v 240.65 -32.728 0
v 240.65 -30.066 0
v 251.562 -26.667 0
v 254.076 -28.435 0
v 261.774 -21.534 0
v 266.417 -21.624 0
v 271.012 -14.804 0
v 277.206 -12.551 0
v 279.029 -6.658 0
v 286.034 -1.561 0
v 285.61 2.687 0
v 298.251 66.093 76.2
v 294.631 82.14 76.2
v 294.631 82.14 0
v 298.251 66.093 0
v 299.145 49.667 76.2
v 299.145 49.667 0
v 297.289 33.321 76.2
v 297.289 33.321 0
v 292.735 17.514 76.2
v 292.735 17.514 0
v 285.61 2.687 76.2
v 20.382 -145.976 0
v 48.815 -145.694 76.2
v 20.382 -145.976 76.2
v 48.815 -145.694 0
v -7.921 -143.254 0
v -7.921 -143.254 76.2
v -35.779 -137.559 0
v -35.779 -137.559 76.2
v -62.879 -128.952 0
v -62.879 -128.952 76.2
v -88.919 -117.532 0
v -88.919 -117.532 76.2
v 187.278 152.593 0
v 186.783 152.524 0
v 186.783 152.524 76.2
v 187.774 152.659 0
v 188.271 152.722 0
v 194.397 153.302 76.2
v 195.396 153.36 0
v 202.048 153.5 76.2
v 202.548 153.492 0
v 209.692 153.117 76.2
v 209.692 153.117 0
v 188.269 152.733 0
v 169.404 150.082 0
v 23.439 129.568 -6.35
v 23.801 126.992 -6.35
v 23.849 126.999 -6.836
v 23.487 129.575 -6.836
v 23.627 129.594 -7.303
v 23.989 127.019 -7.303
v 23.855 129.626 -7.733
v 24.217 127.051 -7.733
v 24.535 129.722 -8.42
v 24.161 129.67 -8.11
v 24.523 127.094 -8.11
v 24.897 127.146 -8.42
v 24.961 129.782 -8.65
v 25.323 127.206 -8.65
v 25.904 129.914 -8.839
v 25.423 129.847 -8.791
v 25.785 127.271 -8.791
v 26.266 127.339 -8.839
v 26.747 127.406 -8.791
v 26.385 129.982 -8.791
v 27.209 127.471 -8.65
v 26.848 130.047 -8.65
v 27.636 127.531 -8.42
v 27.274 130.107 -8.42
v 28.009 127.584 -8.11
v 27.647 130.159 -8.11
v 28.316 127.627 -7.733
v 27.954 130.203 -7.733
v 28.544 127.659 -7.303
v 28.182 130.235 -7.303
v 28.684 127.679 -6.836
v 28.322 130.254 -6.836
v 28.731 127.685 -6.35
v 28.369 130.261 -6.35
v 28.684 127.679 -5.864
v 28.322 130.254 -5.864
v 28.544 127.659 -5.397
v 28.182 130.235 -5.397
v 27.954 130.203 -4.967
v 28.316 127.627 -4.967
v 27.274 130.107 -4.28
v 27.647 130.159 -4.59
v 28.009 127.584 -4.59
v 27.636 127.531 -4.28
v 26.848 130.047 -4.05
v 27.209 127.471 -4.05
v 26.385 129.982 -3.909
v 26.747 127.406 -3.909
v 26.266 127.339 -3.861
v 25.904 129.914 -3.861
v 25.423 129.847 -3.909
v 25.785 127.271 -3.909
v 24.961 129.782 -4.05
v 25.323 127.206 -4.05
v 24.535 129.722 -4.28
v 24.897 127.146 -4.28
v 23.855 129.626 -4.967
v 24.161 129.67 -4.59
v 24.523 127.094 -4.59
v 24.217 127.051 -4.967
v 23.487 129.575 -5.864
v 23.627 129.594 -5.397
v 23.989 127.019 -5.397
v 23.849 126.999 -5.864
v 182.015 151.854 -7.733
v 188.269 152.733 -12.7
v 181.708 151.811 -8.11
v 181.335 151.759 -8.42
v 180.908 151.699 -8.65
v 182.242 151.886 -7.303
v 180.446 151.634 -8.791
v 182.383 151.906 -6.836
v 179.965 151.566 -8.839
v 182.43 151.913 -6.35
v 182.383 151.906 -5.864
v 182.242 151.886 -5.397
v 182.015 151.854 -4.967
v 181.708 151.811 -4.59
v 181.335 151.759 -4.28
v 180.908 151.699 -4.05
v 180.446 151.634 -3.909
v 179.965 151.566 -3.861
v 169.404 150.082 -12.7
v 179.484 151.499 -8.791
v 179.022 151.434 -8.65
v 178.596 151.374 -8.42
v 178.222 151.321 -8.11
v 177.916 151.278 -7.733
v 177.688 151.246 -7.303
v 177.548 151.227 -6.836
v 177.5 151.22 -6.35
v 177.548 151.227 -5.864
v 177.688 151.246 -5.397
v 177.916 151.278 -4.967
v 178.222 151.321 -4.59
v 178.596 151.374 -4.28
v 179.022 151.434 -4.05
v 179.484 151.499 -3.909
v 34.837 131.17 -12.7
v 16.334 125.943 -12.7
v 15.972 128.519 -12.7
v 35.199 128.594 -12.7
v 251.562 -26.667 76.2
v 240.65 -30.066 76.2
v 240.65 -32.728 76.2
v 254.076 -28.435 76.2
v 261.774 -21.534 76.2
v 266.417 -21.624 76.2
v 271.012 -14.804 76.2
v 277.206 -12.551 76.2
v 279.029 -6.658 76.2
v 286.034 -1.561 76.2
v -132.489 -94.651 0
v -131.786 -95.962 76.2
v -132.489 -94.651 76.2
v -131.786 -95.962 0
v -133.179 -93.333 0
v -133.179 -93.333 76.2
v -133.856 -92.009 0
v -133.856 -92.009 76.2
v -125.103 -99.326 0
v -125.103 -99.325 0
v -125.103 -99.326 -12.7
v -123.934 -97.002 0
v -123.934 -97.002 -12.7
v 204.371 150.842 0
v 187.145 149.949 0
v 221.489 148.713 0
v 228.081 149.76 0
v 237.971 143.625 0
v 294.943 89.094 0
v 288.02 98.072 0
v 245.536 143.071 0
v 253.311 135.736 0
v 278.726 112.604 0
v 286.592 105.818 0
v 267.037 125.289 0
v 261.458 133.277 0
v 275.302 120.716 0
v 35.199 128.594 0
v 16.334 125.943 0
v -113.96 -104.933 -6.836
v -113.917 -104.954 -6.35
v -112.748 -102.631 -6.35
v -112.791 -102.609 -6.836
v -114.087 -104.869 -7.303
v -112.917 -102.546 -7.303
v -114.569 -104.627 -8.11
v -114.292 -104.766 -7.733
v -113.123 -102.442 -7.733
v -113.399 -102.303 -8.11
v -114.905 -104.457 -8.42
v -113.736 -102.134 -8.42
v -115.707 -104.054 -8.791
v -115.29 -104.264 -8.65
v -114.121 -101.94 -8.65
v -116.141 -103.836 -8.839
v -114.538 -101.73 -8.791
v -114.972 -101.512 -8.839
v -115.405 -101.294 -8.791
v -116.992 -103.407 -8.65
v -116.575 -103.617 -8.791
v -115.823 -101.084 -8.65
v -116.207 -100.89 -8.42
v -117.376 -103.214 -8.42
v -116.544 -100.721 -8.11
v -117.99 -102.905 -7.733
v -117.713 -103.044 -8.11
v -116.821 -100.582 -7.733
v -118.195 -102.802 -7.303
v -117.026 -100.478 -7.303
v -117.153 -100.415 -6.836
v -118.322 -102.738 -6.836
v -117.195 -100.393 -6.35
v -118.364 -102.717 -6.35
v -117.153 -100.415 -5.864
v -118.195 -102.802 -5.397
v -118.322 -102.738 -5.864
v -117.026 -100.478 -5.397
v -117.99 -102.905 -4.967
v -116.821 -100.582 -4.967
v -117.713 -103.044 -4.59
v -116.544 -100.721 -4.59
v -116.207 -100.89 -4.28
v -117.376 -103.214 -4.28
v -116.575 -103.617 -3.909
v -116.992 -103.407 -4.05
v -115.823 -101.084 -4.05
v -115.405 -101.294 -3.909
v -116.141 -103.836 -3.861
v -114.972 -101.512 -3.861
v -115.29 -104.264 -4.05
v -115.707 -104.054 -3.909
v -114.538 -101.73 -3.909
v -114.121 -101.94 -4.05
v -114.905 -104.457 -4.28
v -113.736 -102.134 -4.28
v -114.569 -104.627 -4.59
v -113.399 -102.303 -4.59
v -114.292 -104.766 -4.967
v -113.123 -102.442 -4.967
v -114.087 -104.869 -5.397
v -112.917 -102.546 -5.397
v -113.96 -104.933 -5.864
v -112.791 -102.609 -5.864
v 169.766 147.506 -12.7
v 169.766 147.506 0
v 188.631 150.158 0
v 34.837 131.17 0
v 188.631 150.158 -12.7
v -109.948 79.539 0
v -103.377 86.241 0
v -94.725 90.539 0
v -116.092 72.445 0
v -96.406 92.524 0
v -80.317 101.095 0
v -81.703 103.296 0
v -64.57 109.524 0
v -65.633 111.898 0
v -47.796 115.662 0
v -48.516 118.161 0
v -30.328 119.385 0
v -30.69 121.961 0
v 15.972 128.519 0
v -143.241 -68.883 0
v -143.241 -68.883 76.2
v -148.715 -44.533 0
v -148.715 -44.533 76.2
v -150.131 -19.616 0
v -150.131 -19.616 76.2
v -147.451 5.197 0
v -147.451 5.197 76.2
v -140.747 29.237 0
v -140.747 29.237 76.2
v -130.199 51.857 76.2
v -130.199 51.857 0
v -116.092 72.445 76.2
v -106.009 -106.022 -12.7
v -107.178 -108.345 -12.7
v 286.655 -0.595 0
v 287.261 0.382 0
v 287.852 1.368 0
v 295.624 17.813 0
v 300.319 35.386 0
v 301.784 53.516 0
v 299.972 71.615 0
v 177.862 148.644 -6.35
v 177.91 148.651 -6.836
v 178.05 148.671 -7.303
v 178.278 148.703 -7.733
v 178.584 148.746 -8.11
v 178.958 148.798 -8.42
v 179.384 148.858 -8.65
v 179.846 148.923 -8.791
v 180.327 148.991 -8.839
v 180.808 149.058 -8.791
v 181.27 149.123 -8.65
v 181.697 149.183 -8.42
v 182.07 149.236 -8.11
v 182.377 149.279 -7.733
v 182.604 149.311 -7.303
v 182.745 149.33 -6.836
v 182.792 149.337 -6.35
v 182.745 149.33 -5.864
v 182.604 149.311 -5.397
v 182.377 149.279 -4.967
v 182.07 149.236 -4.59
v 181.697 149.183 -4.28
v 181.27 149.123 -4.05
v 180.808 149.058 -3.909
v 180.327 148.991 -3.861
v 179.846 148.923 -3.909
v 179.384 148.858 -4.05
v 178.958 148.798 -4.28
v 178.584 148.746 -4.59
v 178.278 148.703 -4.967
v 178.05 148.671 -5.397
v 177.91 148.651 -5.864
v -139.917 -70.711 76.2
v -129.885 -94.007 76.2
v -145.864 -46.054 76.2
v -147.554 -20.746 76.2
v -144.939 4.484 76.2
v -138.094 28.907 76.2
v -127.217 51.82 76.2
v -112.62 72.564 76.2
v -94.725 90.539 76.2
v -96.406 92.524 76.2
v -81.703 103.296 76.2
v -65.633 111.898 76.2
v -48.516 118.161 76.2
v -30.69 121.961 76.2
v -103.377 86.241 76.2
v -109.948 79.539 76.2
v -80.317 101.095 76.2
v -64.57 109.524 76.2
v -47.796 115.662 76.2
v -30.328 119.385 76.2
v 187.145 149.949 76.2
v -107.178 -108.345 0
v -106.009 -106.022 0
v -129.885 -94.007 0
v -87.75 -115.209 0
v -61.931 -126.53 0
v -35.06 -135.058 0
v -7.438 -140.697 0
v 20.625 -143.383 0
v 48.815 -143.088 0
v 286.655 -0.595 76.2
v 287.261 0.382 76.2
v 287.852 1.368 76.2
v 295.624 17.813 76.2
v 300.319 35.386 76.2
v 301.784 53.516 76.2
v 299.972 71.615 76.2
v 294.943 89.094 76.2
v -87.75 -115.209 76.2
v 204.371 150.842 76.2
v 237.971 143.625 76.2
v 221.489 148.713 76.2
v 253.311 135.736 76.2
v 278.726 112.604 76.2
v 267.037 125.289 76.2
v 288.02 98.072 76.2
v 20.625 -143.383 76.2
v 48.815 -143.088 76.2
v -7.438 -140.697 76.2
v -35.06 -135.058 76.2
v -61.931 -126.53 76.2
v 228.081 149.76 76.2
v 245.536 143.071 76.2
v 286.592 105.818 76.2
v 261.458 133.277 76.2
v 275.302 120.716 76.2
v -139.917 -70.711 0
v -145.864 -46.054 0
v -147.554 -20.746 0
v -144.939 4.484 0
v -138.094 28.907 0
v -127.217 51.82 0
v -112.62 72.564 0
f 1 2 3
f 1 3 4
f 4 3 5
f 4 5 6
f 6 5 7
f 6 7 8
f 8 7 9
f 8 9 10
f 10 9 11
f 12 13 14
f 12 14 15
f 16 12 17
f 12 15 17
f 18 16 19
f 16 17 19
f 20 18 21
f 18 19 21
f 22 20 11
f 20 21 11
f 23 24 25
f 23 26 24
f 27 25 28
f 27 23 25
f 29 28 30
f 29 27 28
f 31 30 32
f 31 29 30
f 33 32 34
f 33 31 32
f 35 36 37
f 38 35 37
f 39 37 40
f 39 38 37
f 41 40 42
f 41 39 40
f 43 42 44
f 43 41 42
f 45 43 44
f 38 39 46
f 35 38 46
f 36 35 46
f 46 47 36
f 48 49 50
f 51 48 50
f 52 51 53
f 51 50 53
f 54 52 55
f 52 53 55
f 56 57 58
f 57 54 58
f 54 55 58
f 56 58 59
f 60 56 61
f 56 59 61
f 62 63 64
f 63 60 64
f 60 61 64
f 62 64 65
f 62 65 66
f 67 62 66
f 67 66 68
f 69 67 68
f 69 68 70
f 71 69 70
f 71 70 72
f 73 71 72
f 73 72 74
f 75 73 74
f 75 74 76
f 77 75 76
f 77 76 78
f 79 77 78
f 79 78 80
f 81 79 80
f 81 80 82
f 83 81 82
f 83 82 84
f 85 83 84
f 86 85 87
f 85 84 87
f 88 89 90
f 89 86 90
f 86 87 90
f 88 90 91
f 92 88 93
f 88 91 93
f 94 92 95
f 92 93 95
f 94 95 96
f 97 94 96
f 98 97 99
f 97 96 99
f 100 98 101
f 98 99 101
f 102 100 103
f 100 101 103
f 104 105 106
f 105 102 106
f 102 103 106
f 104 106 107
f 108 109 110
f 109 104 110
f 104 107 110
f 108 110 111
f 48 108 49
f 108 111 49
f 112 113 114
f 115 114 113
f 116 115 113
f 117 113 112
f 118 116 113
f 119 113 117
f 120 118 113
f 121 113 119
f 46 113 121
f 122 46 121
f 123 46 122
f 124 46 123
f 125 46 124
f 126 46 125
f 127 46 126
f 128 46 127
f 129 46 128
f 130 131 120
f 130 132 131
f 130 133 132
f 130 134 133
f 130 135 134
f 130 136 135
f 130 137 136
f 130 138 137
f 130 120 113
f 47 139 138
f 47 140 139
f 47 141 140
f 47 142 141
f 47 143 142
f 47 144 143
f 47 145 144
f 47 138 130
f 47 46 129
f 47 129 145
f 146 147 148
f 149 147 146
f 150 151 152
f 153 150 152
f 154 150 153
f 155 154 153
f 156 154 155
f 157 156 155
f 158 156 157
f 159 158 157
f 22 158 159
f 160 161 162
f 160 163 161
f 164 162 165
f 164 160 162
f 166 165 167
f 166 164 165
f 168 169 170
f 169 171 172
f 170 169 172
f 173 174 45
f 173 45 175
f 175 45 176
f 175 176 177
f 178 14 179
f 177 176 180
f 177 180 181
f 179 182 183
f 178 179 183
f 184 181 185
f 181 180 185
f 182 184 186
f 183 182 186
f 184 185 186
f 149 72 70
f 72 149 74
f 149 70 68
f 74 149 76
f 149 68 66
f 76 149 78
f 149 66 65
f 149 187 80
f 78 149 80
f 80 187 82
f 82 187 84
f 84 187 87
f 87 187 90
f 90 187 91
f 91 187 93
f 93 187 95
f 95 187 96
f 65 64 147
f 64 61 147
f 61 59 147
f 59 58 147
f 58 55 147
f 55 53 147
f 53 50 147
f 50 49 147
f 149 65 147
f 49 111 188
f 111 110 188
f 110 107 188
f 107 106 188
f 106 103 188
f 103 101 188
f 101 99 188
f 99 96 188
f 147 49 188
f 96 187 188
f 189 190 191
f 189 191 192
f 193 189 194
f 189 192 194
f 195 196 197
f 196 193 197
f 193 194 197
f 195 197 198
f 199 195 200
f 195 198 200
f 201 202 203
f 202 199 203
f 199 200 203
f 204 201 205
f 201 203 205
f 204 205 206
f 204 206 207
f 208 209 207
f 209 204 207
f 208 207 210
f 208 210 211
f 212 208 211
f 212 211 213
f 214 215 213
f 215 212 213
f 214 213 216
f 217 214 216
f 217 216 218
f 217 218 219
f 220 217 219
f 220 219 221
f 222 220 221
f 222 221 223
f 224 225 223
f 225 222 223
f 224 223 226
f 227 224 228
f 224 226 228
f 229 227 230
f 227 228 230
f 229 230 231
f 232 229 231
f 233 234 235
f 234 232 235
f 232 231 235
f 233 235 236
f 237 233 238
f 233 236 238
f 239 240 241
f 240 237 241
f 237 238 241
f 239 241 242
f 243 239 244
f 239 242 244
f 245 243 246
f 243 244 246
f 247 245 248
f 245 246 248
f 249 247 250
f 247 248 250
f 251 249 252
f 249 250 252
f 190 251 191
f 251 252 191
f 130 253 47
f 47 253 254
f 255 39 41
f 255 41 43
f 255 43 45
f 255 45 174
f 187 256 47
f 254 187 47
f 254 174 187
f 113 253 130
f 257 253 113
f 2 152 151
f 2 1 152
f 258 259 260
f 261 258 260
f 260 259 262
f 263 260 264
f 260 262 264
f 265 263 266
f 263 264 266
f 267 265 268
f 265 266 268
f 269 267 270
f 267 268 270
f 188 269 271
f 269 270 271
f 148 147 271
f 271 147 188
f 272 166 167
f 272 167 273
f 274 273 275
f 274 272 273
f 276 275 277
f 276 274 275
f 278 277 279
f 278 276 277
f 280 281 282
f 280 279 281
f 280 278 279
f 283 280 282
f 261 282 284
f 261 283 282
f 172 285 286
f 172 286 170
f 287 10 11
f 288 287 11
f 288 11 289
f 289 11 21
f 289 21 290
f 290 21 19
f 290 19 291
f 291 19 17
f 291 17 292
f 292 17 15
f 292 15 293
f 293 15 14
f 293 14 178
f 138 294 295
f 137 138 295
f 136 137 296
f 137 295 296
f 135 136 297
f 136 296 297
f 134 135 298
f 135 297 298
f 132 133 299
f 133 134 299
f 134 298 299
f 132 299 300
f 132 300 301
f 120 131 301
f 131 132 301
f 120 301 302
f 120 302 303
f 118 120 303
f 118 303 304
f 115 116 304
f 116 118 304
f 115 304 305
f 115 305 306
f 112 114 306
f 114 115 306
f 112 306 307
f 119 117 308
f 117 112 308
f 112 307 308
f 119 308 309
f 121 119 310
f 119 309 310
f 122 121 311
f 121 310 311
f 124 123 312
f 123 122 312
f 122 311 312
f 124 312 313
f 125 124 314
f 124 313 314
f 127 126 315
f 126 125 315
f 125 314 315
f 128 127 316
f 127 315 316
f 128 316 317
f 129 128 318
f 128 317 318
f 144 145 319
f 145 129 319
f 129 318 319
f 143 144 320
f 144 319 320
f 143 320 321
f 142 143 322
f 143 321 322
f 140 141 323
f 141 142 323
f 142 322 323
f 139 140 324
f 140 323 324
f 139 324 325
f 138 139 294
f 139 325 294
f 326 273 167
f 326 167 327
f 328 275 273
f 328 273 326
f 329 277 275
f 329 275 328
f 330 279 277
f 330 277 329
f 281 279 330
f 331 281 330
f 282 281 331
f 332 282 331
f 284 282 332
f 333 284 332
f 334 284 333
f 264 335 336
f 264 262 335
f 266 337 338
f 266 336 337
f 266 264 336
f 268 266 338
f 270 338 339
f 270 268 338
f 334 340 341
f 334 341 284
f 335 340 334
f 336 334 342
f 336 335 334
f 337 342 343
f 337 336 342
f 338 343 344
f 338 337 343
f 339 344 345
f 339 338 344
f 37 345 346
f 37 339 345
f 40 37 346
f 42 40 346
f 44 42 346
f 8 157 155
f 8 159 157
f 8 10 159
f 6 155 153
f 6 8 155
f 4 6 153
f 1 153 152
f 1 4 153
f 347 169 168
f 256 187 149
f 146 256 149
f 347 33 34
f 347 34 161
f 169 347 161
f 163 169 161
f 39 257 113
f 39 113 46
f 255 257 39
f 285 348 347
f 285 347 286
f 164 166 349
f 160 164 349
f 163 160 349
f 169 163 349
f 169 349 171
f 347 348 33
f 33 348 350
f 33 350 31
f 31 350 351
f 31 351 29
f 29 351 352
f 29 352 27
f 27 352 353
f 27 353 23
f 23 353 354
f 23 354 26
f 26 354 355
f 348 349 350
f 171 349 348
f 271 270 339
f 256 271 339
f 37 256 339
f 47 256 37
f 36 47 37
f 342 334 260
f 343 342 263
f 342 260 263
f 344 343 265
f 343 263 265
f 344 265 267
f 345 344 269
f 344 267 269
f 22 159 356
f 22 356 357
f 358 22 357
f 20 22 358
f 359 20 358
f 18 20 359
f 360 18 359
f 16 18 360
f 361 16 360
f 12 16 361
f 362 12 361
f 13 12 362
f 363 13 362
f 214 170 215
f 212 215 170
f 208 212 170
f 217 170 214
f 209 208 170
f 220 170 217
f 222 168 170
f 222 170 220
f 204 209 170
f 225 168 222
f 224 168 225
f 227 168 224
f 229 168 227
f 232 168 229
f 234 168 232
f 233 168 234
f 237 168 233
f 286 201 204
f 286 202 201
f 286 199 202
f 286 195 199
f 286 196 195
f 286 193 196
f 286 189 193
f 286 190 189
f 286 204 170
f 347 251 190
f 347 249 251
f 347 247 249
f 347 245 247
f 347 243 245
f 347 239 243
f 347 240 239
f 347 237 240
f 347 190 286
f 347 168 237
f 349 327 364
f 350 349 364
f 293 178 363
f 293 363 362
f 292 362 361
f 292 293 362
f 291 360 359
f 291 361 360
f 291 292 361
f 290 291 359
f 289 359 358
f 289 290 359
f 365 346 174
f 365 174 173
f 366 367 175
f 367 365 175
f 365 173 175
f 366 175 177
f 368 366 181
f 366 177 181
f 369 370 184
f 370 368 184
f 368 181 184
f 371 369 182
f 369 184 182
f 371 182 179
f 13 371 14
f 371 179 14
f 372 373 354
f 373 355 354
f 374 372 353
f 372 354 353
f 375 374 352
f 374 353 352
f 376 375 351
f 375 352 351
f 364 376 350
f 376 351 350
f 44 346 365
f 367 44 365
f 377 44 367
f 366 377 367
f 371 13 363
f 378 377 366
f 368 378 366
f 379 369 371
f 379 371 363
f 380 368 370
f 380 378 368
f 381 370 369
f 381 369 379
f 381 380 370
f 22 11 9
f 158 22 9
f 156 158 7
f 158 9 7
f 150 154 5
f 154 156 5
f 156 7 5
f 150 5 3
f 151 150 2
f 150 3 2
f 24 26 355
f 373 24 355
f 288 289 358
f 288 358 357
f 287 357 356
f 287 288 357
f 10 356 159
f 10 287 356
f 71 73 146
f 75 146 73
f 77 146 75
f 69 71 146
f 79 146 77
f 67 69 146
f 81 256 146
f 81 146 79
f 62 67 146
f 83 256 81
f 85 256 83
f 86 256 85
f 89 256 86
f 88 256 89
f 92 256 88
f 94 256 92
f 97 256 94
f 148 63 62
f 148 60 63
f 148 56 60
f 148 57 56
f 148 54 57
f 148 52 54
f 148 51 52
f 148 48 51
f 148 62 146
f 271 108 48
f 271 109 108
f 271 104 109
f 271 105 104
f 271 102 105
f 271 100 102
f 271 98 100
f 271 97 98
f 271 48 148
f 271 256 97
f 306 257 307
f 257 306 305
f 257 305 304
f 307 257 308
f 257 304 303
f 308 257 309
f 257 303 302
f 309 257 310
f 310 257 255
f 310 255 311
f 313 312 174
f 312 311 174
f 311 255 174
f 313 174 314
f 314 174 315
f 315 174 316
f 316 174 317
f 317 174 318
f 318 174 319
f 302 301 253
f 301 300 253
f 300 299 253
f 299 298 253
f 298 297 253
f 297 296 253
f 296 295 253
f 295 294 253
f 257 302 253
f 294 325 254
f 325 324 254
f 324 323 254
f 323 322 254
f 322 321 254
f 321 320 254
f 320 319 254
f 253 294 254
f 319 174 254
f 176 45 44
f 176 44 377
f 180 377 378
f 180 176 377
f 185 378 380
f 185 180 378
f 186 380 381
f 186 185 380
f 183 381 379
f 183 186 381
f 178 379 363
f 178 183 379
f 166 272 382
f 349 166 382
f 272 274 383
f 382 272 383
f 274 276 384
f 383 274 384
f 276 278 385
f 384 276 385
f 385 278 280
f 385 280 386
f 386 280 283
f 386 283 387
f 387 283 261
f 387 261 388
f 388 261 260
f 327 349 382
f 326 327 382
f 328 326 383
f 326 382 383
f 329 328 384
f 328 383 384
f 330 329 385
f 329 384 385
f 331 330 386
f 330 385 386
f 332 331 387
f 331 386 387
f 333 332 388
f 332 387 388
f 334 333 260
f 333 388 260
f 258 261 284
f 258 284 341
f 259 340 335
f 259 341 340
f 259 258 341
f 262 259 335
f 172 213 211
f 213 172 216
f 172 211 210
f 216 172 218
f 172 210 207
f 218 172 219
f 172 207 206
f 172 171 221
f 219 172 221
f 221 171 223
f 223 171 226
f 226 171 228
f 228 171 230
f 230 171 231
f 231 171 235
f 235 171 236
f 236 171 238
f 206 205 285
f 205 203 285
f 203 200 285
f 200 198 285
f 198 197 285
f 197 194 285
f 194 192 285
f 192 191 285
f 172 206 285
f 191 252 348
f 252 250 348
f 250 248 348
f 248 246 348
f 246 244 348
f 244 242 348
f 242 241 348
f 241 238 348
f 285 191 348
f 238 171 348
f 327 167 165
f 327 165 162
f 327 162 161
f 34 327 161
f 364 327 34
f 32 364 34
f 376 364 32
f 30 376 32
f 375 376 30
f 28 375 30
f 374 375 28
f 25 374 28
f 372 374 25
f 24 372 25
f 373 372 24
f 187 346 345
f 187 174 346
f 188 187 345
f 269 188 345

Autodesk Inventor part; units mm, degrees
ref_plane "YZ Plane" through (0, 0, 0) normal (1, 0, 0) x (0, 1, 0)
ref_plane "XZ Plane" through (0, 0, 0) normal (0, 1, 0) x (-1, 0, 0)
ref_plane "XY Plane" through (0, 0, 0) normal (0, 0, 1) x (1, 0, 0)
ref_plane "Work Plane1" through (0, 0, 0) normal (0, 0, 1) x (1, 0, 0)
sketch "Sketch1" plane through (0, 0, 0) normal (0, 0, 1) x (1, 0, 0)
  line L0 (-149.3377, -84.2183) -> (-62.5438, -127.8928) projected
  arc A0 (-30.3276, 119.385) -> (-94.7251, 90.539) centre (-12.6526, -6.379) ccw projected
  line L1 (-94.7251, 90.539) -> (-158.4791, 36.5506) projected
  line L2 (267.4038, 161.2284) -> (-30.3276, 119.385) projected
  arc A1 (285.61, 2.6867) -> (293.3792, 54.1689) centre (225.4026, 38.1) ccw projected
  line L3 (293.3792, 54.1689) -> (297.7515, 151.832) projected
  line L4 (297.7015, -118.5771) -> (285.61, 2.6867) projected
  line L5 (-30.3276, 119.385) -> (187.1449, 149.9488)
  arc A2 (285.61, 2.6867) -> (187.1449, 149.9488) centre (200.8332, 52.5515) ccw
  arc A3 (240.6498, -30.0656) -> (285.61, 2.6867) centre (225.4026, 38.1) ccw
  arc A4 (-30.3276, 119.385) -> (-94.7251, 90.539) centre (-12.6526, -6.379) ccw
  line L6 (-149.3377, -84.2183) -> (-62.5438, -127.8928) projected
  line L7 (-129.8851, -94.0069) -> (-87.7502, -115.209)
  arc A5 (-94.7251, 90.539) -> (-129.8851, -94.0069) centre (1.8279, -23.4787) ccw
  arc A6 (-87.7502, -115.209) -> (48.8152, -143.0877) centre (31.9315, 122.6334) ccw
  arc A7 (-88.9193, -117.5324) -> (48.8152, -145.6938) centre (31.9315, 122.6334) ccw
  line L8 (-88.9193, -117.5324) -> (-131.786, -95.962)
  arc A8 (-96.406, 92.5238) -> (-131.786, -95.962) centre (1.8279, -23.4787) ccw
  arc A9 (-30.6896, 121.9607) -> (-96.406, 92.5238) centre (-12.6526, -6.379) ccw
  line L9 (-30.6896, 121.9607) -> (186.7829, 152.5244)
  arc A10 (287.8519, 1.3681) -> (186.7829, 152.5244) centre (200.8332, 52.5515) ccw
  arc A11 (240.6498, -32.7284) -> (287.8519, 1.3681) centre (225.4026, 38.1) ccw
  line L10 (48.8152, -145.6938) -> (48.8152, -143.0877)
  line L11 (240.6498, -32.7284) -> (240.6498, -30.0656)
  dimension "d24" = 2.601
extrude "Extrusion1" add sketch "Sketch1" along normal blind 76.2 contours L0 A6 L10 A7 L8 A8 | L0 A8 L1 A5 | L1 A8 A9 L9 A10 L2 A0 | L2 A10 L3 A2 | L3 A10 A11 L4 A2 | L4 A11 L11 A3
ref_plane "Work Plane2" through (-66.6974, 114.2736, 0) normal (-0.1392, 0.9903, 0) x (-0.9903, -0.1392, 0)
sketch "Sketch2" plane through (-66.6974, 114.2736, 0) normal (-0.1392, 0.9903, 0) x (-0.9903, -0.1392, 0)
  circle A0 centre (-93.8772, -6.35) radius 2.4892 projected
  circle A1 centre (-249.4522, -6.35) radius 2.4892 projected
  line L0 (-422.3221, 0) -> (51.093, 0) projected
  line L1 (-36.7272, -12.7) -> (-337.3845, -12.7) projected
  line L2 (-36.7272, 0) -> (-256.3369, 0) projected
  line L3 (-102.8977, 0) -> (-102.8977, -12.7)
  line L4 (-83.8477, -12.7) -> (-102.8977, -12.7)
  line L5 (-83.8477, -12.7) -> (-83.8477, 0)
  circle A2 centre (-93.8772, -6.35) radius 2.4892
  line L6 (-16.5377, -12.7) -> (-16.5377, 0)
  circle A3 centre (-249.4522, -6.35) radius 2.4892
  line L7 (-354.6914, 0) -> (-256.3369, 0) projected
  line L8 (-257.8377, -12.7) -> (-238.7877, -12.7)
  line L9 (-238.7877, -12.7) -> (-238.7877, 0)
  line L10 (-257.8377, -12.7) -> (-257.8377, 0)
  line L11 (-238.7877, 0) -> (-257.8377, 0)
  line L12 (-83.8477, 0) -> (-102.8977, 0)
  line L13 (-97.2698, 0) -> (-97.2698, 76.2) projected
  point P0 (-50.1445, 0)
  point P1 (-333.3488, 0)
  dimension "d7" = 19.05
  dimension "d8" = 67.31
  dimension "d9" = 135.89
  dimension "d10" = 19.05
extrude "Extrusion2" add sketch "Sketch2" along normal blind 2.601 contours L0 L9 L1 L10 | L0 L5 L1 L3
ref_plane "Work Plane5" through (6.35, -162.56, 0) normal (-0.4495, -0.8933, 0) x (0.8933, -0.4495, 0)
sketch "Sketch5" plane through (6.35, -162.56, 0) normal (-0.4495, -0.8933, 0) x (0.8933, -0.4495, 0)
  circle A0 centre (-135.8153, -6.35) radius 2.4892 projected
  line L0 (-174.2873, 0) -> (-77.1244, 0) projected
  line L1 (-77.1244, -12.7) -> (-174.2873, -12.7) projected
  line L2 (-105.3421, 0) -> (-152.5108, 0) projected
  line L3 (-145.8483, 0) -> (-125.7823, 0)
  line L4 (-125.7823, 0) -> (-125.7823, -12.7)
  circle A1 centre (-135.8153, -6.35) radius 2.4892
  line L5 (-145.8483, 0) -> (-145.8483, -12.7)
  line L6 (-125.7823, -12.7) -> (-145.8483, -12.7)
  point P0 (-78.7426, 0)
  point P1 (-125.7823, 0)
  dimension "d25" = 10.033
  dimension "d26" = 10.033
extrude "Extrusion5" add sketch "Sketch5" along normal blind 2.601
properties part number "ChainGuard"
